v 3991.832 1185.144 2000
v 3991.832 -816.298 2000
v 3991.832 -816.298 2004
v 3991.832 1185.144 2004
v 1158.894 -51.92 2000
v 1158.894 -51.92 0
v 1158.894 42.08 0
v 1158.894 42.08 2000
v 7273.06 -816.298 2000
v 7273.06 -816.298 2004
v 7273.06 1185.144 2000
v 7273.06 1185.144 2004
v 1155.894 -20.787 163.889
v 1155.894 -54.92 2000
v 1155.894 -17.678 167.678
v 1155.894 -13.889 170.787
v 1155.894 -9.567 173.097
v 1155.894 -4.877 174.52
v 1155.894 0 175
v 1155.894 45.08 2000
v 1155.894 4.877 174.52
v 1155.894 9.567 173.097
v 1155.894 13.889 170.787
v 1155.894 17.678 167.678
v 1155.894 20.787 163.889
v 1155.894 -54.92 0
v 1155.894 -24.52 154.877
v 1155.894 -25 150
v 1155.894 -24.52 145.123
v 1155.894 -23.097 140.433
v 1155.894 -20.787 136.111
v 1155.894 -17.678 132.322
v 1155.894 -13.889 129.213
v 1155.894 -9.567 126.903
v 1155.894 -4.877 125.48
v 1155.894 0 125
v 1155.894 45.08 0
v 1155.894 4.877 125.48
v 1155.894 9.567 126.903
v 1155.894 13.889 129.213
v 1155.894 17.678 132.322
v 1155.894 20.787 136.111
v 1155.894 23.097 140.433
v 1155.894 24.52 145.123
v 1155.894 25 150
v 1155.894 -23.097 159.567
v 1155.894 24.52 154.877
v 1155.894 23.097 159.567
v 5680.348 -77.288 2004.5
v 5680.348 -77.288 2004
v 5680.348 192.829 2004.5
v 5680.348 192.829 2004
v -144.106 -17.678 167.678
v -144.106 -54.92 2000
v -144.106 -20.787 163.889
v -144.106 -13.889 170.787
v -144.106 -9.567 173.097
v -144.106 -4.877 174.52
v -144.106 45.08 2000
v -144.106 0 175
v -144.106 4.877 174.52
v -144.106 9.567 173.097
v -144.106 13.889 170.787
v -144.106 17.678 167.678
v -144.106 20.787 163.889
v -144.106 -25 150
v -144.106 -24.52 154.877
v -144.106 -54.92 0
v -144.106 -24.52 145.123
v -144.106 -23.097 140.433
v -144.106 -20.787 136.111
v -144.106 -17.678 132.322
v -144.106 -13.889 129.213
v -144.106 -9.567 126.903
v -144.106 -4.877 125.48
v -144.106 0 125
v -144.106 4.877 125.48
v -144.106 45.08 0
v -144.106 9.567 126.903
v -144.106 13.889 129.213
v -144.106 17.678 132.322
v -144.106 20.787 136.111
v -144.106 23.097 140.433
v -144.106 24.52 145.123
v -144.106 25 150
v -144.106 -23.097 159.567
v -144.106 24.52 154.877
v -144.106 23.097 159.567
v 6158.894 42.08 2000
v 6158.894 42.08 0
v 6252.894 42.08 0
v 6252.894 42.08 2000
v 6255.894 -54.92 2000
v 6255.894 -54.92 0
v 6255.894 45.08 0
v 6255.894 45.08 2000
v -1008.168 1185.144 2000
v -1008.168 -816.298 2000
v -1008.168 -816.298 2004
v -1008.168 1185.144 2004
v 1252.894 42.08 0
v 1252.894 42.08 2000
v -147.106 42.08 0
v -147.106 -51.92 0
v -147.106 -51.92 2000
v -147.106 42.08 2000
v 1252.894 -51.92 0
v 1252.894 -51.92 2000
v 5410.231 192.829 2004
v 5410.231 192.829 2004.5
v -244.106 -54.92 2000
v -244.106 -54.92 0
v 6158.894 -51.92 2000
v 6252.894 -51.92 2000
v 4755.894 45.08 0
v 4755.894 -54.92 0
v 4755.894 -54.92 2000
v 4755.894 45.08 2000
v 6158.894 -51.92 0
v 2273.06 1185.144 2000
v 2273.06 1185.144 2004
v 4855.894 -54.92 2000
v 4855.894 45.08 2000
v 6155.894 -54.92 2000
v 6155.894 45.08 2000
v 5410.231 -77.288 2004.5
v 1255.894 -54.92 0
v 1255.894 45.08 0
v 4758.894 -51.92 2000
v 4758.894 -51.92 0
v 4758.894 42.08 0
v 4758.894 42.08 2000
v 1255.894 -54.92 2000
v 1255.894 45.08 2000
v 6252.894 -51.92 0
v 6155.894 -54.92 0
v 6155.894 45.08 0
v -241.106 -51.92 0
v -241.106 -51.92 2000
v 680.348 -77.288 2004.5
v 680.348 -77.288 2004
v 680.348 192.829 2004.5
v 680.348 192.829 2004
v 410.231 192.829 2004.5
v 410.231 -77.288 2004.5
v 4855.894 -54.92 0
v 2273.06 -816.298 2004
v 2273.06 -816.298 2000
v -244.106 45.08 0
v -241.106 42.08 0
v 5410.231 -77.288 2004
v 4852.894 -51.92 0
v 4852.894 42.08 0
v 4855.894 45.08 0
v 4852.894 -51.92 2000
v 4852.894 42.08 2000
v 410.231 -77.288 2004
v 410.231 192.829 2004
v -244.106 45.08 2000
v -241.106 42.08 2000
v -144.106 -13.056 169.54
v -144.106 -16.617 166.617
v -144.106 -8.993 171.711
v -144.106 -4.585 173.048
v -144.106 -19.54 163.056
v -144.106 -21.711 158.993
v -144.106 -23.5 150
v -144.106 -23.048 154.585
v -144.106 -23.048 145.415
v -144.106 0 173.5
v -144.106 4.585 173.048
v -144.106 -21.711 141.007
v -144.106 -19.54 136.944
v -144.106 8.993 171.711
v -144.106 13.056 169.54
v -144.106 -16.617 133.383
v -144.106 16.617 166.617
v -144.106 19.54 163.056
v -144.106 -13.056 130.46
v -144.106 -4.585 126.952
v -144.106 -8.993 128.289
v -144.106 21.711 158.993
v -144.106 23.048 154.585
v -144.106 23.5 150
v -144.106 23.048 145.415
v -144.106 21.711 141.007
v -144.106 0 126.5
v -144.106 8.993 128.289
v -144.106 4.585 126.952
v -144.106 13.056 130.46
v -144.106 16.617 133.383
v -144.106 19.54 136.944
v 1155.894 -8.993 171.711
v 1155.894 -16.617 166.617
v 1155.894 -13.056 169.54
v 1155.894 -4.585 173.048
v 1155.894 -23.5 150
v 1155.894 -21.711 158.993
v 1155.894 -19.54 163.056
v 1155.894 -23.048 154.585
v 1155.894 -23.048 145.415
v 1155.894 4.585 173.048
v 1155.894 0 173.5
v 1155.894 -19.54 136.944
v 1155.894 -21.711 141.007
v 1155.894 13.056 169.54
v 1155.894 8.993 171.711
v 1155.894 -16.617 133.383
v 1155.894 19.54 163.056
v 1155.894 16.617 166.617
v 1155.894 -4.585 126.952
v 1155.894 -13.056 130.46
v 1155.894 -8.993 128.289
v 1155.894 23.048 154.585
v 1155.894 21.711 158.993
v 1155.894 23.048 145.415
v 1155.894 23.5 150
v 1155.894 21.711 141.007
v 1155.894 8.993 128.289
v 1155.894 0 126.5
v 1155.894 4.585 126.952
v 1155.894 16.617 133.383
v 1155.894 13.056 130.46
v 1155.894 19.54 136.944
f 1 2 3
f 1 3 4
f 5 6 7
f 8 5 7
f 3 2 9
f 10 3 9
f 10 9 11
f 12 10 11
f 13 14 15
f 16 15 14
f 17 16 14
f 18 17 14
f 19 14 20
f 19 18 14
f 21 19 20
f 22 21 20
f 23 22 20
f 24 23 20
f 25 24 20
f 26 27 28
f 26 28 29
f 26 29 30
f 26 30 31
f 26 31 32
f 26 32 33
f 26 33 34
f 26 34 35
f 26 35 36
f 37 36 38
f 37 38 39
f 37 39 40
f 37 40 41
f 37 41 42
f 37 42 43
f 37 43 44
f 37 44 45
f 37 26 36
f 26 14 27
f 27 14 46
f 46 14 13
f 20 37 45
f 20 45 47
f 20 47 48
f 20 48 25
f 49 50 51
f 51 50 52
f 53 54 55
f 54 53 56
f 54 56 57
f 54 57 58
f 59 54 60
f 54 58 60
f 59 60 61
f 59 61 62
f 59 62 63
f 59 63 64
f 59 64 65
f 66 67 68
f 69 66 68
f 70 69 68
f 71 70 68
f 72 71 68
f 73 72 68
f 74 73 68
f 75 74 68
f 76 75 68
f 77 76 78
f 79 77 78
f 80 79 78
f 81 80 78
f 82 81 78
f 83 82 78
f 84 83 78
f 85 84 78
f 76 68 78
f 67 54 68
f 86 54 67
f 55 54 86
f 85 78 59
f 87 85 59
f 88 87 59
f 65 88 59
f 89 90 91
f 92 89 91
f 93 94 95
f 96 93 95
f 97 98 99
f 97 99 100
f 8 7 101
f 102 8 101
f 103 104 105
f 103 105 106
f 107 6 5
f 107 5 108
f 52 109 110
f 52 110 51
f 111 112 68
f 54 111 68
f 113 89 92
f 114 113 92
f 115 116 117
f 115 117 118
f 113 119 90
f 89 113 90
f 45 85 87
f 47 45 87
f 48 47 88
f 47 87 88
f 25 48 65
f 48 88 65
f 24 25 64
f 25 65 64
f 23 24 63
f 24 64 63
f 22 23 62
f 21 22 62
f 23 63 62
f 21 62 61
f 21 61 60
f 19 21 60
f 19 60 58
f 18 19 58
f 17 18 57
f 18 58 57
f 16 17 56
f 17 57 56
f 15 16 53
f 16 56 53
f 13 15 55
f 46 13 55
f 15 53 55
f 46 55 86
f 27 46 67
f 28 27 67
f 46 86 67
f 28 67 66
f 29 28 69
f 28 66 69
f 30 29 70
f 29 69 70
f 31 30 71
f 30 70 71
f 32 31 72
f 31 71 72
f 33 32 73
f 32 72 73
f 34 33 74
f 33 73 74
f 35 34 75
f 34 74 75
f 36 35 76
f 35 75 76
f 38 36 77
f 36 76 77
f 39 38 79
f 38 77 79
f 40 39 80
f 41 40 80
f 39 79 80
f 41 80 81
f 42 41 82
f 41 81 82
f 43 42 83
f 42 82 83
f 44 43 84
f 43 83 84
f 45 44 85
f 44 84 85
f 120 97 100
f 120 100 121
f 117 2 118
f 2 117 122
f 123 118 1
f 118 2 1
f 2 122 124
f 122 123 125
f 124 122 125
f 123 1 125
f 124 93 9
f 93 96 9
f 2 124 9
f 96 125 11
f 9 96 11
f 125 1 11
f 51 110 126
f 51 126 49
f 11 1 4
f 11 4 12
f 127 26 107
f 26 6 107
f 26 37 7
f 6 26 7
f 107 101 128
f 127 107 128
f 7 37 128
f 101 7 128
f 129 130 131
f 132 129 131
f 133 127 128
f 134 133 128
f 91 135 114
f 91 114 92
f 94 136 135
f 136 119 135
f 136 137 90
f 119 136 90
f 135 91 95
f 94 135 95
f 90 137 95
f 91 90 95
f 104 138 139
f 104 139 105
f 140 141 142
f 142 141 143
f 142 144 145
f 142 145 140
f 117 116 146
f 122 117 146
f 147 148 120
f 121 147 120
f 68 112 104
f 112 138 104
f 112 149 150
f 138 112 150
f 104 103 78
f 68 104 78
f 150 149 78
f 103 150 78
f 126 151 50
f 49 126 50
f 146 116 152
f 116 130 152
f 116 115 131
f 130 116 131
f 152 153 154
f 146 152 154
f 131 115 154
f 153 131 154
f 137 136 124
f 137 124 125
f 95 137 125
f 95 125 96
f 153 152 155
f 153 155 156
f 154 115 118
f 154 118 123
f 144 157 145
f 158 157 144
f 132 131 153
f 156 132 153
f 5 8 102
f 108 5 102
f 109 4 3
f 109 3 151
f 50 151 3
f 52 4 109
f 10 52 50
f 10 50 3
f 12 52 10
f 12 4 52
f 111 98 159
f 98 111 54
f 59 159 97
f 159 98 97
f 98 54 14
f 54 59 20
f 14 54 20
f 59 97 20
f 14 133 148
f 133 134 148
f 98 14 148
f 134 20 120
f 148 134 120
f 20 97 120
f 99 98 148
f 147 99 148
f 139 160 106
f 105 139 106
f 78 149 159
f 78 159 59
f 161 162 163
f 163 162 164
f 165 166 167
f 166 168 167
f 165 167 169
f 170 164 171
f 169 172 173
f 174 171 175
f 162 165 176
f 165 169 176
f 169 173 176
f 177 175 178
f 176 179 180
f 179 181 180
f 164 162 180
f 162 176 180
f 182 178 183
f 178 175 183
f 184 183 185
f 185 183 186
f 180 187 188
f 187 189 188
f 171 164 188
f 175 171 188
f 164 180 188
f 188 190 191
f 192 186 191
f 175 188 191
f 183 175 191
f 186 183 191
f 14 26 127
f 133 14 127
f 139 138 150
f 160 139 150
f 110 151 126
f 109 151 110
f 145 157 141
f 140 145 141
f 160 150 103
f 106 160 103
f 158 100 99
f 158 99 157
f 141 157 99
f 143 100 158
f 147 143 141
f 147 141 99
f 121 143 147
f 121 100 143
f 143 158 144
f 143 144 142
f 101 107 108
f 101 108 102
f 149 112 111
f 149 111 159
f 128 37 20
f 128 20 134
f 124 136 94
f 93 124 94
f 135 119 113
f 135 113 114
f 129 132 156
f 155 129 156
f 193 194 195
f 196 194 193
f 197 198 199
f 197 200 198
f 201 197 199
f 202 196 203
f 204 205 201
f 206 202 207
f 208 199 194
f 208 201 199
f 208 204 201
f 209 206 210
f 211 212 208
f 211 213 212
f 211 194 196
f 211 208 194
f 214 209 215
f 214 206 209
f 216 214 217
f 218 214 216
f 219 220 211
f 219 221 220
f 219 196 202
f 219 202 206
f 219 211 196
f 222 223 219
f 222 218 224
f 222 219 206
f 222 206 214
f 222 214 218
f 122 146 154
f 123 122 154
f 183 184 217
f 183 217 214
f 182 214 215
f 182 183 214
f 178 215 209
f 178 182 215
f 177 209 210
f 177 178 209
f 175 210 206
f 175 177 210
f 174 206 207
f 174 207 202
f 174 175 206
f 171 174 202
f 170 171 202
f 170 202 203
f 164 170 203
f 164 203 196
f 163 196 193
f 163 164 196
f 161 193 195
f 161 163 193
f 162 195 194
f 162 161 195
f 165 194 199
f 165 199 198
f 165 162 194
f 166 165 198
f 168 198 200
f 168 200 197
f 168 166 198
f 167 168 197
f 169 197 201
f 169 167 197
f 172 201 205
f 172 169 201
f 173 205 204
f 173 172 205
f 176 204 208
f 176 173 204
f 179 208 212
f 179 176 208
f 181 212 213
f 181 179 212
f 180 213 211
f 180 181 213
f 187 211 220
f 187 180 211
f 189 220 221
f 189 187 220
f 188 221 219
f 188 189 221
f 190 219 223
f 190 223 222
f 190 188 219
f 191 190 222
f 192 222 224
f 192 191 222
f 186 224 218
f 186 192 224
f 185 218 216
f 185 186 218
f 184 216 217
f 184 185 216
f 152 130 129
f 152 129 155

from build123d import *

# Parameters (mm, degrees)
F0_W      = 100
F0_H      = 100
F0_W_2    = 94
F0_H_2    = 94
F1_DEPTH  = 2000
F2_R      = 25
F2_R_2    = 23.5
F3_DEPTH  = 1300
F4_W      = 3281.227827
F4_H      = 2001.44279
F5_DEPTH  = 4
F6_W      = 270.116926
F6_H      = 270.116925
F7_DEPTH  = 0.5
F9_W      = 899.782896
F9_H      = 436.490618
F10_DEPTH = 1300


with BuildPart() as f1:
    # F0 (on Top) → F1 (new body)
    with BuildSketch(Plane.XY):
        with Locations((-194.106018, -4.919838)):
            Rectangle(F0_W, F0_H)
        with Locations((-194.106018, -4.919838)):
            Rectangle(F0_W_2, F0_H_2, mode=Mode.SUBTRACT)
        with Locations((1205.893982, -4.919838)):
            Rectangle(F0_W, F0_H)
        with Locations((1205.893982, -4.919838)):
            Rectangle(F0_W_2, F0_H_2, mode=Mode.SUBTRACT)
    extrude(amount=F1_DEPTH)

    # F2 (on face) → F3 (join, through all)
    with BuildSketch(Plane.YZ.offset(-144.106018)):
        with Locations((0, 150)):
            Circle(F2_R)
        with Locations((0, 150)):
            Circle(F2_R_2, mode=Mode.SUBTRACT)
    extrude(amount=F3_DEPTH)

    # F4 (on face) → F5 (join)
    with BuildSketch(Plane.XY.offset(2000)):
        with Locations((632.445931, 184.42291)):
            Rectangle(F4_W, F4_H)
    extrude(amount=F5_DEPTH)

    # F6 (on face) → F7 (join)
    with BuildSketch(Plane.XY.offset(2004)):
        with Locations((545.289576, 57.770937)):
            Rectangle(F6_W, F6_H)
    extrude(amount=F7_DEPTH)


with BuildPart() as f8_1:
    # F8: copy of F1
    add(f1.part.moved(Location((5000, 0, 0))))

    # F9 (on face) → F10 (cut)
    with BuildSketch(Plane.YZ.offset(4855.893982)):
        with Locations((10.314554, 177.6294)):
            Rectangle(F9_W, F9_H)
    extrude(amount=F10_DEPTH, mode=Mode.SUBTRACT)


solid = Compound([f1.part, f8_1.part])
